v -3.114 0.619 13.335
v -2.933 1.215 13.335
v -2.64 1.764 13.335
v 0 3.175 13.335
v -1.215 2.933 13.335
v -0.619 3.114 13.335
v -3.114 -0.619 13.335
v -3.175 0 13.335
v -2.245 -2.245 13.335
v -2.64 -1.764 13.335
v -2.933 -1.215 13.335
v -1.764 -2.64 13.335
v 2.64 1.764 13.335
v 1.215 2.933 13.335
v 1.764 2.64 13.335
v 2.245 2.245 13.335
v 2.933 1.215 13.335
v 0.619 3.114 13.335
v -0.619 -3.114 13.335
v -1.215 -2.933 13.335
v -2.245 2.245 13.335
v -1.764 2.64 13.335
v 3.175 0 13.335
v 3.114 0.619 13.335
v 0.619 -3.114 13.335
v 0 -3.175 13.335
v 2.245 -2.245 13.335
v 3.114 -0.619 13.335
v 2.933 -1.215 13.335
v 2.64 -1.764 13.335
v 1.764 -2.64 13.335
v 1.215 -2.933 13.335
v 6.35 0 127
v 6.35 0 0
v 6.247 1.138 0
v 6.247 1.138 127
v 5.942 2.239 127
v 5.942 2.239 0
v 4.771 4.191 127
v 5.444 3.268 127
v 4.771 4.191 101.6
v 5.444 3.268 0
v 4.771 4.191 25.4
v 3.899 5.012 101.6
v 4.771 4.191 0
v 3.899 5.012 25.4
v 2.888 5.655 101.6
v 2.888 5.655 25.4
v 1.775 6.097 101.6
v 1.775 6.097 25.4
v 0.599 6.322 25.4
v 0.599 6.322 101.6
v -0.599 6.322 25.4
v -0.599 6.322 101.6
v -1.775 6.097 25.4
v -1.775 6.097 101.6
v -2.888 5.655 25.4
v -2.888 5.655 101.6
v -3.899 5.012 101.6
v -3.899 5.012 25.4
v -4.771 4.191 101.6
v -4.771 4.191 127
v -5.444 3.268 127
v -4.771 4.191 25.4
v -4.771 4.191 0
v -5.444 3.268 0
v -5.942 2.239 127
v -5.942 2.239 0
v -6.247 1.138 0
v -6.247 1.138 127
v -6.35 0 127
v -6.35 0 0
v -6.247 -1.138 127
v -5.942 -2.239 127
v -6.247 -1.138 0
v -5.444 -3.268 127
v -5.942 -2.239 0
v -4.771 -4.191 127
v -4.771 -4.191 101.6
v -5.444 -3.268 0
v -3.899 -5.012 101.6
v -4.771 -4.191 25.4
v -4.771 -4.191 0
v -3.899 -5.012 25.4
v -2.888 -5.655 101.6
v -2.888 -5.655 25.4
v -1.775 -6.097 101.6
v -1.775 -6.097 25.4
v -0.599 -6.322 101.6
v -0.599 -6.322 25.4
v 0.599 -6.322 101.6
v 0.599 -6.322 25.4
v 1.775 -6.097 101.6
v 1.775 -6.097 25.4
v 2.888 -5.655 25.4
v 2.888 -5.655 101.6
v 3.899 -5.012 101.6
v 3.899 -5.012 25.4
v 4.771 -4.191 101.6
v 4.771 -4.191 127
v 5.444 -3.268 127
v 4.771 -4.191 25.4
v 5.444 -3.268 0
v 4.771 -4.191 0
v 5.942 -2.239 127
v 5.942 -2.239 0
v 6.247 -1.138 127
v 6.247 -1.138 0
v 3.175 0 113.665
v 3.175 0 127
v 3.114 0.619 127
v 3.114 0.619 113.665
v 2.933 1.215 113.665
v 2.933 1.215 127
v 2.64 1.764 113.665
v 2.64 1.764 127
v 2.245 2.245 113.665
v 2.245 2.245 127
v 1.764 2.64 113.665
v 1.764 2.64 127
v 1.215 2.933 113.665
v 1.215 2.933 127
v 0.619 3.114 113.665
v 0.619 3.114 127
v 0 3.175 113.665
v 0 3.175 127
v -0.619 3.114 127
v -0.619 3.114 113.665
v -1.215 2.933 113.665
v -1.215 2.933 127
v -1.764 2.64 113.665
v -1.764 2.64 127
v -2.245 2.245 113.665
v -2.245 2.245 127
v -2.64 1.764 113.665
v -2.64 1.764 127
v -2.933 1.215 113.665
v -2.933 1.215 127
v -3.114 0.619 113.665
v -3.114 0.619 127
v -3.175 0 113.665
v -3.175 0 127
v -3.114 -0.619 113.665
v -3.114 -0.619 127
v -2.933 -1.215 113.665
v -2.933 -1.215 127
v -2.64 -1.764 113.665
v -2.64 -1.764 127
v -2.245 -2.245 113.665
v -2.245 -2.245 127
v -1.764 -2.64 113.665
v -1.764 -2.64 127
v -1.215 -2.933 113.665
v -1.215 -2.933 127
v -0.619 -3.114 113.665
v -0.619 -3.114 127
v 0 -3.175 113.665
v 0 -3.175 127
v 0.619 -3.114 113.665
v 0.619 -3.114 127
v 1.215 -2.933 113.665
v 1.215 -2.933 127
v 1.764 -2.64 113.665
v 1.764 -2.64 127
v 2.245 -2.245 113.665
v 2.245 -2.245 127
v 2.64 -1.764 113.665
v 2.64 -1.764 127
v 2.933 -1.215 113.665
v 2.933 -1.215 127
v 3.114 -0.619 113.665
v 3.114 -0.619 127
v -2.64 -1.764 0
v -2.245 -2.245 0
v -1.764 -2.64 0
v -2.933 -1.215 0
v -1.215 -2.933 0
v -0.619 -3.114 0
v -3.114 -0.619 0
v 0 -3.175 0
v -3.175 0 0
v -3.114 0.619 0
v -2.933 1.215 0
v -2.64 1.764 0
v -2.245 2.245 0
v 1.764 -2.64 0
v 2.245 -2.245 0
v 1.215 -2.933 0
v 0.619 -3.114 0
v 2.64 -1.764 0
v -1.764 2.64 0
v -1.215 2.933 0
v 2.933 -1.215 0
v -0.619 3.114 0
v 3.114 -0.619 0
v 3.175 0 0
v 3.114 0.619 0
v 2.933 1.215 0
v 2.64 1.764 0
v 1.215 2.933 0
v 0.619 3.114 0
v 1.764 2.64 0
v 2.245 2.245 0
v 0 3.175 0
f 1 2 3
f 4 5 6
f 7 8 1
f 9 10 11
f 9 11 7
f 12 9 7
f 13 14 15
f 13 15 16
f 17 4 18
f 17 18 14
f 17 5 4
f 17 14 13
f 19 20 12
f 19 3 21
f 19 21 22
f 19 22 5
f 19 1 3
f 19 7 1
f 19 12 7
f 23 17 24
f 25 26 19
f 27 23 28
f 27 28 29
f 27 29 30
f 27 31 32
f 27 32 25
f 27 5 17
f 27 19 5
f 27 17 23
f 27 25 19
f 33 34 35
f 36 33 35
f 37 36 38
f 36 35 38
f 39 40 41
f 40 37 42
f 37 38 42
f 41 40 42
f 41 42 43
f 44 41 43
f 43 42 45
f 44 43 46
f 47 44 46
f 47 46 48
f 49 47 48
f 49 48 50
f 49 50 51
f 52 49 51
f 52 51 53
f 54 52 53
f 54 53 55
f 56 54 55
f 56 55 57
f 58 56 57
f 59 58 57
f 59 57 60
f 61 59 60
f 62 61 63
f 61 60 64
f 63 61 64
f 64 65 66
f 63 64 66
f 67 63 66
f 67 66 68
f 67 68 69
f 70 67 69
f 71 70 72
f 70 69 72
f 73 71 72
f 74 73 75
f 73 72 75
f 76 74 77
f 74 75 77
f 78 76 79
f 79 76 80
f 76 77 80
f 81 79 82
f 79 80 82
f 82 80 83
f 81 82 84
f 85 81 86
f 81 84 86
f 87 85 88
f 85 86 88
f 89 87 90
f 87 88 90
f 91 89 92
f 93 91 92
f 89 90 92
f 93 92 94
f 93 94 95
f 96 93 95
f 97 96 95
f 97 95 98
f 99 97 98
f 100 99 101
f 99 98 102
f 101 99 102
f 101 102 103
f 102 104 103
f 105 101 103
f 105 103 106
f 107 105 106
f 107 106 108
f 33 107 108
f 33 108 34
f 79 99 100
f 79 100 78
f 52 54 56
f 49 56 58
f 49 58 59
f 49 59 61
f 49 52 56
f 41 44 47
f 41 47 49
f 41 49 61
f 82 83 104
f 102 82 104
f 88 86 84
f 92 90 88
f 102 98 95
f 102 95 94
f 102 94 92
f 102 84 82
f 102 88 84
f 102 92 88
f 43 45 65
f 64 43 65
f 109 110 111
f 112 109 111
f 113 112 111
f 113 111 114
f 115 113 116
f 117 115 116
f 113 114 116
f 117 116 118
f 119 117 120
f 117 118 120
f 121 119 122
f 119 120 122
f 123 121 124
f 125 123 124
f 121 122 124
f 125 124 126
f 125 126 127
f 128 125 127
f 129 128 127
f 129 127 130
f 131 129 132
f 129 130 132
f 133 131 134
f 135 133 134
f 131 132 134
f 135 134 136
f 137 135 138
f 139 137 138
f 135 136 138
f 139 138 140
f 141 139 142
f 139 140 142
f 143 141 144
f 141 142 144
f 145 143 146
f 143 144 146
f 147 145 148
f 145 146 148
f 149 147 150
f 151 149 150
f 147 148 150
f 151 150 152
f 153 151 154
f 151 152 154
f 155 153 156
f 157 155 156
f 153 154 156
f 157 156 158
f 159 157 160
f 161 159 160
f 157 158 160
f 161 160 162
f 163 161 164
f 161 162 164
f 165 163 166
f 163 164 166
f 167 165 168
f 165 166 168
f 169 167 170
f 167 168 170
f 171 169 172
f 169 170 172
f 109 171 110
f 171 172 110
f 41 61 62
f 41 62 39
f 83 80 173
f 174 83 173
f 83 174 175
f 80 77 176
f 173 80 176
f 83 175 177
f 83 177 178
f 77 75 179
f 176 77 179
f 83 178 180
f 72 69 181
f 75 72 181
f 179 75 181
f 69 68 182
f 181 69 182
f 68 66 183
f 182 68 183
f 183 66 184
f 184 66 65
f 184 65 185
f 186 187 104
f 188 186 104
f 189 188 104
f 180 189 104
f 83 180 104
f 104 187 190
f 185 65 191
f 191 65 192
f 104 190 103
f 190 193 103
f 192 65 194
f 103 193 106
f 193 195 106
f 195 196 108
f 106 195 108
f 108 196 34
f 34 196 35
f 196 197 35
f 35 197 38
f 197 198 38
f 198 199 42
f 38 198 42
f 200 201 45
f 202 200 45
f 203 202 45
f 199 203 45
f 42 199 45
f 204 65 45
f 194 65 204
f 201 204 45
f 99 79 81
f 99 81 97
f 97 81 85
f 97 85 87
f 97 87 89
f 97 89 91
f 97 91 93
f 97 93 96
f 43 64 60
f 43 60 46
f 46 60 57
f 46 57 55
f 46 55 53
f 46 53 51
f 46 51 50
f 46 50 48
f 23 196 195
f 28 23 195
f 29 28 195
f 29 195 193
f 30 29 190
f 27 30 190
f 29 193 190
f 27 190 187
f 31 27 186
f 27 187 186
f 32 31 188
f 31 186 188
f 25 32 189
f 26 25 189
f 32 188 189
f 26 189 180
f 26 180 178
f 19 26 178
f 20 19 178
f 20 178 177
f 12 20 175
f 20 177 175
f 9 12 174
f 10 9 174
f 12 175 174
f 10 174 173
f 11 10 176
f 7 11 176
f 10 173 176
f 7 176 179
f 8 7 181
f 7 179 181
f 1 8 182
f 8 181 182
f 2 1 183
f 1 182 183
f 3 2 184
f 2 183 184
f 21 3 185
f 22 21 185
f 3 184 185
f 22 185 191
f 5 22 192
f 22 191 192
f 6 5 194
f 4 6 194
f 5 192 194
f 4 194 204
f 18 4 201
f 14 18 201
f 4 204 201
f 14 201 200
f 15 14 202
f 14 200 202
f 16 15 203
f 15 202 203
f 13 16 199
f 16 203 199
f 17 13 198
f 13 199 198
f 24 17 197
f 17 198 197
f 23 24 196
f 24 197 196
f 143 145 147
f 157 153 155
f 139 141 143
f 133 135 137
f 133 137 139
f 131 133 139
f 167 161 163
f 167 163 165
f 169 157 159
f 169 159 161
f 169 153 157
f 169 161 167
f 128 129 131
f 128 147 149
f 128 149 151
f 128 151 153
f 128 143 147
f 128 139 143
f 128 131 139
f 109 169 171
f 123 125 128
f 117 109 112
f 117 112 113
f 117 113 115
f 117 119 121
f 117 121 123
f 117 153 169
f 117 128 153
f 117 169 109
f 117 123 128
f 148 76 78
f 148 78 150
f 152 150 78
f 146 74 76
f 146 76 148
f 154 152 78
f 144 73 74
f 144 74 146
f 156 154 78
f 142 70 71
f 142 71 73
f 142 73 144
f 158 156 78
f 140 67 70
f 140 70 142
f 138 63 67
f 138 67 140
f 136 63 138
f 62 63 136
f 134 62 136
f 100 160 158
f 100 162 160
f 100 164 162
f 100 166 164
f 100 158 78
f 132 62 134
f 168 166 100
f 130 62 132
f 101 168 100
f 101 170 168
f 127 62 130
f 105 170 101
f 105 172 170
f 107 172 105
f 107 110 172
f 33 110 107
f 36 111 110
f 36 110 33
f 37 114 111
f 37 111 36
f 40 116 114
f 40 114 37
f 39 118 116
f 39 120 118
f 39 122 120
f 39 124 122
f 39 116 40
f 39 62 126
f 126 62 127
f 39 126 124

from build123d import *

# Parameters (mm, degrees)
F0_R     = 6.35
F1_DEPTH = 127
F2_R     = 3.175
F3_DEPTH = 13.335
F4_R     = 3.175
F5_DEPTH = 13.335
F7_DEPTH = 25.4
F9_DEPTH = 25.4


with BuildPart() as f1:
    # F0 (on Top) → F1 (new body)
    with BuildSketch(Plane.XY):
        Circle(F0_R)
    extrude(amount=F1_DEPTH)

    # F2 (on face) → F3 (cut)
    with BuildSketch(Plane(origin=(0, 0, 0), x_dir=(1, 0, 0), z_dir=(0, 0, -1))):
        Circle(F2_R)
    extrude(amount=-F3_DEPTH, mode=Mode.SUBTRACT)

    # F4 (on face) → F5 (cut)
    with BuildSketch(Plane.XY.offset(127)):
        Circle(F4_R)
    extrude(amount=-F5_DEPTH, mode=Mode.SUBTRACT)

    # F6 (on face) → F7 (cut)
    with BuildSketch(Plane(origin=(0, 0, 0), x_dir=(1, 0, 0), z_dir=(0, 0, -1))):
        with BuildLine():
            Line((-4.7705365526, 4.191), (4.7705365526, 4.191))
            ThreePointArc((4.7705365526, 4.191), (0, 6.35), (-4.7705365526, 4.191))
        make_face()
        with BuildLine():
            Line((4.7705365526, -4.191), (-4.7705365526, -4.191))
            ThreePointArc((-4.7705365526, -4.191), (0, -6.35), (4.7705365526, -4.191))
        make_face()
    extrude(amount=-F7_DEPTH, mode=Mode.SUBTRACT)

    # F8 (on face) → F9 (cut)
    with BuildSketch(Plane.XY.offset(127)):
        with BuildLine():
            Line((4.7705365526, -4.191), (-4.7705365526, -4.191))
            ThreePointArc((-4.7705365526, -4.191), (0, -6.35), (4.7705365526, -4.191))
        make_face()
        with BuildLine():
            ThreePointArc((4.7705365526, 4.191), (0, 6.35), (-4.7705365526, 4.191))
            Line((-4.7705365526, 4.191), (4.7705365526, 4.191))
        make_face()
    extrude(amount=-F9_DEPTH, mode=Mode.SUBTRACT)


solid = f1.part
